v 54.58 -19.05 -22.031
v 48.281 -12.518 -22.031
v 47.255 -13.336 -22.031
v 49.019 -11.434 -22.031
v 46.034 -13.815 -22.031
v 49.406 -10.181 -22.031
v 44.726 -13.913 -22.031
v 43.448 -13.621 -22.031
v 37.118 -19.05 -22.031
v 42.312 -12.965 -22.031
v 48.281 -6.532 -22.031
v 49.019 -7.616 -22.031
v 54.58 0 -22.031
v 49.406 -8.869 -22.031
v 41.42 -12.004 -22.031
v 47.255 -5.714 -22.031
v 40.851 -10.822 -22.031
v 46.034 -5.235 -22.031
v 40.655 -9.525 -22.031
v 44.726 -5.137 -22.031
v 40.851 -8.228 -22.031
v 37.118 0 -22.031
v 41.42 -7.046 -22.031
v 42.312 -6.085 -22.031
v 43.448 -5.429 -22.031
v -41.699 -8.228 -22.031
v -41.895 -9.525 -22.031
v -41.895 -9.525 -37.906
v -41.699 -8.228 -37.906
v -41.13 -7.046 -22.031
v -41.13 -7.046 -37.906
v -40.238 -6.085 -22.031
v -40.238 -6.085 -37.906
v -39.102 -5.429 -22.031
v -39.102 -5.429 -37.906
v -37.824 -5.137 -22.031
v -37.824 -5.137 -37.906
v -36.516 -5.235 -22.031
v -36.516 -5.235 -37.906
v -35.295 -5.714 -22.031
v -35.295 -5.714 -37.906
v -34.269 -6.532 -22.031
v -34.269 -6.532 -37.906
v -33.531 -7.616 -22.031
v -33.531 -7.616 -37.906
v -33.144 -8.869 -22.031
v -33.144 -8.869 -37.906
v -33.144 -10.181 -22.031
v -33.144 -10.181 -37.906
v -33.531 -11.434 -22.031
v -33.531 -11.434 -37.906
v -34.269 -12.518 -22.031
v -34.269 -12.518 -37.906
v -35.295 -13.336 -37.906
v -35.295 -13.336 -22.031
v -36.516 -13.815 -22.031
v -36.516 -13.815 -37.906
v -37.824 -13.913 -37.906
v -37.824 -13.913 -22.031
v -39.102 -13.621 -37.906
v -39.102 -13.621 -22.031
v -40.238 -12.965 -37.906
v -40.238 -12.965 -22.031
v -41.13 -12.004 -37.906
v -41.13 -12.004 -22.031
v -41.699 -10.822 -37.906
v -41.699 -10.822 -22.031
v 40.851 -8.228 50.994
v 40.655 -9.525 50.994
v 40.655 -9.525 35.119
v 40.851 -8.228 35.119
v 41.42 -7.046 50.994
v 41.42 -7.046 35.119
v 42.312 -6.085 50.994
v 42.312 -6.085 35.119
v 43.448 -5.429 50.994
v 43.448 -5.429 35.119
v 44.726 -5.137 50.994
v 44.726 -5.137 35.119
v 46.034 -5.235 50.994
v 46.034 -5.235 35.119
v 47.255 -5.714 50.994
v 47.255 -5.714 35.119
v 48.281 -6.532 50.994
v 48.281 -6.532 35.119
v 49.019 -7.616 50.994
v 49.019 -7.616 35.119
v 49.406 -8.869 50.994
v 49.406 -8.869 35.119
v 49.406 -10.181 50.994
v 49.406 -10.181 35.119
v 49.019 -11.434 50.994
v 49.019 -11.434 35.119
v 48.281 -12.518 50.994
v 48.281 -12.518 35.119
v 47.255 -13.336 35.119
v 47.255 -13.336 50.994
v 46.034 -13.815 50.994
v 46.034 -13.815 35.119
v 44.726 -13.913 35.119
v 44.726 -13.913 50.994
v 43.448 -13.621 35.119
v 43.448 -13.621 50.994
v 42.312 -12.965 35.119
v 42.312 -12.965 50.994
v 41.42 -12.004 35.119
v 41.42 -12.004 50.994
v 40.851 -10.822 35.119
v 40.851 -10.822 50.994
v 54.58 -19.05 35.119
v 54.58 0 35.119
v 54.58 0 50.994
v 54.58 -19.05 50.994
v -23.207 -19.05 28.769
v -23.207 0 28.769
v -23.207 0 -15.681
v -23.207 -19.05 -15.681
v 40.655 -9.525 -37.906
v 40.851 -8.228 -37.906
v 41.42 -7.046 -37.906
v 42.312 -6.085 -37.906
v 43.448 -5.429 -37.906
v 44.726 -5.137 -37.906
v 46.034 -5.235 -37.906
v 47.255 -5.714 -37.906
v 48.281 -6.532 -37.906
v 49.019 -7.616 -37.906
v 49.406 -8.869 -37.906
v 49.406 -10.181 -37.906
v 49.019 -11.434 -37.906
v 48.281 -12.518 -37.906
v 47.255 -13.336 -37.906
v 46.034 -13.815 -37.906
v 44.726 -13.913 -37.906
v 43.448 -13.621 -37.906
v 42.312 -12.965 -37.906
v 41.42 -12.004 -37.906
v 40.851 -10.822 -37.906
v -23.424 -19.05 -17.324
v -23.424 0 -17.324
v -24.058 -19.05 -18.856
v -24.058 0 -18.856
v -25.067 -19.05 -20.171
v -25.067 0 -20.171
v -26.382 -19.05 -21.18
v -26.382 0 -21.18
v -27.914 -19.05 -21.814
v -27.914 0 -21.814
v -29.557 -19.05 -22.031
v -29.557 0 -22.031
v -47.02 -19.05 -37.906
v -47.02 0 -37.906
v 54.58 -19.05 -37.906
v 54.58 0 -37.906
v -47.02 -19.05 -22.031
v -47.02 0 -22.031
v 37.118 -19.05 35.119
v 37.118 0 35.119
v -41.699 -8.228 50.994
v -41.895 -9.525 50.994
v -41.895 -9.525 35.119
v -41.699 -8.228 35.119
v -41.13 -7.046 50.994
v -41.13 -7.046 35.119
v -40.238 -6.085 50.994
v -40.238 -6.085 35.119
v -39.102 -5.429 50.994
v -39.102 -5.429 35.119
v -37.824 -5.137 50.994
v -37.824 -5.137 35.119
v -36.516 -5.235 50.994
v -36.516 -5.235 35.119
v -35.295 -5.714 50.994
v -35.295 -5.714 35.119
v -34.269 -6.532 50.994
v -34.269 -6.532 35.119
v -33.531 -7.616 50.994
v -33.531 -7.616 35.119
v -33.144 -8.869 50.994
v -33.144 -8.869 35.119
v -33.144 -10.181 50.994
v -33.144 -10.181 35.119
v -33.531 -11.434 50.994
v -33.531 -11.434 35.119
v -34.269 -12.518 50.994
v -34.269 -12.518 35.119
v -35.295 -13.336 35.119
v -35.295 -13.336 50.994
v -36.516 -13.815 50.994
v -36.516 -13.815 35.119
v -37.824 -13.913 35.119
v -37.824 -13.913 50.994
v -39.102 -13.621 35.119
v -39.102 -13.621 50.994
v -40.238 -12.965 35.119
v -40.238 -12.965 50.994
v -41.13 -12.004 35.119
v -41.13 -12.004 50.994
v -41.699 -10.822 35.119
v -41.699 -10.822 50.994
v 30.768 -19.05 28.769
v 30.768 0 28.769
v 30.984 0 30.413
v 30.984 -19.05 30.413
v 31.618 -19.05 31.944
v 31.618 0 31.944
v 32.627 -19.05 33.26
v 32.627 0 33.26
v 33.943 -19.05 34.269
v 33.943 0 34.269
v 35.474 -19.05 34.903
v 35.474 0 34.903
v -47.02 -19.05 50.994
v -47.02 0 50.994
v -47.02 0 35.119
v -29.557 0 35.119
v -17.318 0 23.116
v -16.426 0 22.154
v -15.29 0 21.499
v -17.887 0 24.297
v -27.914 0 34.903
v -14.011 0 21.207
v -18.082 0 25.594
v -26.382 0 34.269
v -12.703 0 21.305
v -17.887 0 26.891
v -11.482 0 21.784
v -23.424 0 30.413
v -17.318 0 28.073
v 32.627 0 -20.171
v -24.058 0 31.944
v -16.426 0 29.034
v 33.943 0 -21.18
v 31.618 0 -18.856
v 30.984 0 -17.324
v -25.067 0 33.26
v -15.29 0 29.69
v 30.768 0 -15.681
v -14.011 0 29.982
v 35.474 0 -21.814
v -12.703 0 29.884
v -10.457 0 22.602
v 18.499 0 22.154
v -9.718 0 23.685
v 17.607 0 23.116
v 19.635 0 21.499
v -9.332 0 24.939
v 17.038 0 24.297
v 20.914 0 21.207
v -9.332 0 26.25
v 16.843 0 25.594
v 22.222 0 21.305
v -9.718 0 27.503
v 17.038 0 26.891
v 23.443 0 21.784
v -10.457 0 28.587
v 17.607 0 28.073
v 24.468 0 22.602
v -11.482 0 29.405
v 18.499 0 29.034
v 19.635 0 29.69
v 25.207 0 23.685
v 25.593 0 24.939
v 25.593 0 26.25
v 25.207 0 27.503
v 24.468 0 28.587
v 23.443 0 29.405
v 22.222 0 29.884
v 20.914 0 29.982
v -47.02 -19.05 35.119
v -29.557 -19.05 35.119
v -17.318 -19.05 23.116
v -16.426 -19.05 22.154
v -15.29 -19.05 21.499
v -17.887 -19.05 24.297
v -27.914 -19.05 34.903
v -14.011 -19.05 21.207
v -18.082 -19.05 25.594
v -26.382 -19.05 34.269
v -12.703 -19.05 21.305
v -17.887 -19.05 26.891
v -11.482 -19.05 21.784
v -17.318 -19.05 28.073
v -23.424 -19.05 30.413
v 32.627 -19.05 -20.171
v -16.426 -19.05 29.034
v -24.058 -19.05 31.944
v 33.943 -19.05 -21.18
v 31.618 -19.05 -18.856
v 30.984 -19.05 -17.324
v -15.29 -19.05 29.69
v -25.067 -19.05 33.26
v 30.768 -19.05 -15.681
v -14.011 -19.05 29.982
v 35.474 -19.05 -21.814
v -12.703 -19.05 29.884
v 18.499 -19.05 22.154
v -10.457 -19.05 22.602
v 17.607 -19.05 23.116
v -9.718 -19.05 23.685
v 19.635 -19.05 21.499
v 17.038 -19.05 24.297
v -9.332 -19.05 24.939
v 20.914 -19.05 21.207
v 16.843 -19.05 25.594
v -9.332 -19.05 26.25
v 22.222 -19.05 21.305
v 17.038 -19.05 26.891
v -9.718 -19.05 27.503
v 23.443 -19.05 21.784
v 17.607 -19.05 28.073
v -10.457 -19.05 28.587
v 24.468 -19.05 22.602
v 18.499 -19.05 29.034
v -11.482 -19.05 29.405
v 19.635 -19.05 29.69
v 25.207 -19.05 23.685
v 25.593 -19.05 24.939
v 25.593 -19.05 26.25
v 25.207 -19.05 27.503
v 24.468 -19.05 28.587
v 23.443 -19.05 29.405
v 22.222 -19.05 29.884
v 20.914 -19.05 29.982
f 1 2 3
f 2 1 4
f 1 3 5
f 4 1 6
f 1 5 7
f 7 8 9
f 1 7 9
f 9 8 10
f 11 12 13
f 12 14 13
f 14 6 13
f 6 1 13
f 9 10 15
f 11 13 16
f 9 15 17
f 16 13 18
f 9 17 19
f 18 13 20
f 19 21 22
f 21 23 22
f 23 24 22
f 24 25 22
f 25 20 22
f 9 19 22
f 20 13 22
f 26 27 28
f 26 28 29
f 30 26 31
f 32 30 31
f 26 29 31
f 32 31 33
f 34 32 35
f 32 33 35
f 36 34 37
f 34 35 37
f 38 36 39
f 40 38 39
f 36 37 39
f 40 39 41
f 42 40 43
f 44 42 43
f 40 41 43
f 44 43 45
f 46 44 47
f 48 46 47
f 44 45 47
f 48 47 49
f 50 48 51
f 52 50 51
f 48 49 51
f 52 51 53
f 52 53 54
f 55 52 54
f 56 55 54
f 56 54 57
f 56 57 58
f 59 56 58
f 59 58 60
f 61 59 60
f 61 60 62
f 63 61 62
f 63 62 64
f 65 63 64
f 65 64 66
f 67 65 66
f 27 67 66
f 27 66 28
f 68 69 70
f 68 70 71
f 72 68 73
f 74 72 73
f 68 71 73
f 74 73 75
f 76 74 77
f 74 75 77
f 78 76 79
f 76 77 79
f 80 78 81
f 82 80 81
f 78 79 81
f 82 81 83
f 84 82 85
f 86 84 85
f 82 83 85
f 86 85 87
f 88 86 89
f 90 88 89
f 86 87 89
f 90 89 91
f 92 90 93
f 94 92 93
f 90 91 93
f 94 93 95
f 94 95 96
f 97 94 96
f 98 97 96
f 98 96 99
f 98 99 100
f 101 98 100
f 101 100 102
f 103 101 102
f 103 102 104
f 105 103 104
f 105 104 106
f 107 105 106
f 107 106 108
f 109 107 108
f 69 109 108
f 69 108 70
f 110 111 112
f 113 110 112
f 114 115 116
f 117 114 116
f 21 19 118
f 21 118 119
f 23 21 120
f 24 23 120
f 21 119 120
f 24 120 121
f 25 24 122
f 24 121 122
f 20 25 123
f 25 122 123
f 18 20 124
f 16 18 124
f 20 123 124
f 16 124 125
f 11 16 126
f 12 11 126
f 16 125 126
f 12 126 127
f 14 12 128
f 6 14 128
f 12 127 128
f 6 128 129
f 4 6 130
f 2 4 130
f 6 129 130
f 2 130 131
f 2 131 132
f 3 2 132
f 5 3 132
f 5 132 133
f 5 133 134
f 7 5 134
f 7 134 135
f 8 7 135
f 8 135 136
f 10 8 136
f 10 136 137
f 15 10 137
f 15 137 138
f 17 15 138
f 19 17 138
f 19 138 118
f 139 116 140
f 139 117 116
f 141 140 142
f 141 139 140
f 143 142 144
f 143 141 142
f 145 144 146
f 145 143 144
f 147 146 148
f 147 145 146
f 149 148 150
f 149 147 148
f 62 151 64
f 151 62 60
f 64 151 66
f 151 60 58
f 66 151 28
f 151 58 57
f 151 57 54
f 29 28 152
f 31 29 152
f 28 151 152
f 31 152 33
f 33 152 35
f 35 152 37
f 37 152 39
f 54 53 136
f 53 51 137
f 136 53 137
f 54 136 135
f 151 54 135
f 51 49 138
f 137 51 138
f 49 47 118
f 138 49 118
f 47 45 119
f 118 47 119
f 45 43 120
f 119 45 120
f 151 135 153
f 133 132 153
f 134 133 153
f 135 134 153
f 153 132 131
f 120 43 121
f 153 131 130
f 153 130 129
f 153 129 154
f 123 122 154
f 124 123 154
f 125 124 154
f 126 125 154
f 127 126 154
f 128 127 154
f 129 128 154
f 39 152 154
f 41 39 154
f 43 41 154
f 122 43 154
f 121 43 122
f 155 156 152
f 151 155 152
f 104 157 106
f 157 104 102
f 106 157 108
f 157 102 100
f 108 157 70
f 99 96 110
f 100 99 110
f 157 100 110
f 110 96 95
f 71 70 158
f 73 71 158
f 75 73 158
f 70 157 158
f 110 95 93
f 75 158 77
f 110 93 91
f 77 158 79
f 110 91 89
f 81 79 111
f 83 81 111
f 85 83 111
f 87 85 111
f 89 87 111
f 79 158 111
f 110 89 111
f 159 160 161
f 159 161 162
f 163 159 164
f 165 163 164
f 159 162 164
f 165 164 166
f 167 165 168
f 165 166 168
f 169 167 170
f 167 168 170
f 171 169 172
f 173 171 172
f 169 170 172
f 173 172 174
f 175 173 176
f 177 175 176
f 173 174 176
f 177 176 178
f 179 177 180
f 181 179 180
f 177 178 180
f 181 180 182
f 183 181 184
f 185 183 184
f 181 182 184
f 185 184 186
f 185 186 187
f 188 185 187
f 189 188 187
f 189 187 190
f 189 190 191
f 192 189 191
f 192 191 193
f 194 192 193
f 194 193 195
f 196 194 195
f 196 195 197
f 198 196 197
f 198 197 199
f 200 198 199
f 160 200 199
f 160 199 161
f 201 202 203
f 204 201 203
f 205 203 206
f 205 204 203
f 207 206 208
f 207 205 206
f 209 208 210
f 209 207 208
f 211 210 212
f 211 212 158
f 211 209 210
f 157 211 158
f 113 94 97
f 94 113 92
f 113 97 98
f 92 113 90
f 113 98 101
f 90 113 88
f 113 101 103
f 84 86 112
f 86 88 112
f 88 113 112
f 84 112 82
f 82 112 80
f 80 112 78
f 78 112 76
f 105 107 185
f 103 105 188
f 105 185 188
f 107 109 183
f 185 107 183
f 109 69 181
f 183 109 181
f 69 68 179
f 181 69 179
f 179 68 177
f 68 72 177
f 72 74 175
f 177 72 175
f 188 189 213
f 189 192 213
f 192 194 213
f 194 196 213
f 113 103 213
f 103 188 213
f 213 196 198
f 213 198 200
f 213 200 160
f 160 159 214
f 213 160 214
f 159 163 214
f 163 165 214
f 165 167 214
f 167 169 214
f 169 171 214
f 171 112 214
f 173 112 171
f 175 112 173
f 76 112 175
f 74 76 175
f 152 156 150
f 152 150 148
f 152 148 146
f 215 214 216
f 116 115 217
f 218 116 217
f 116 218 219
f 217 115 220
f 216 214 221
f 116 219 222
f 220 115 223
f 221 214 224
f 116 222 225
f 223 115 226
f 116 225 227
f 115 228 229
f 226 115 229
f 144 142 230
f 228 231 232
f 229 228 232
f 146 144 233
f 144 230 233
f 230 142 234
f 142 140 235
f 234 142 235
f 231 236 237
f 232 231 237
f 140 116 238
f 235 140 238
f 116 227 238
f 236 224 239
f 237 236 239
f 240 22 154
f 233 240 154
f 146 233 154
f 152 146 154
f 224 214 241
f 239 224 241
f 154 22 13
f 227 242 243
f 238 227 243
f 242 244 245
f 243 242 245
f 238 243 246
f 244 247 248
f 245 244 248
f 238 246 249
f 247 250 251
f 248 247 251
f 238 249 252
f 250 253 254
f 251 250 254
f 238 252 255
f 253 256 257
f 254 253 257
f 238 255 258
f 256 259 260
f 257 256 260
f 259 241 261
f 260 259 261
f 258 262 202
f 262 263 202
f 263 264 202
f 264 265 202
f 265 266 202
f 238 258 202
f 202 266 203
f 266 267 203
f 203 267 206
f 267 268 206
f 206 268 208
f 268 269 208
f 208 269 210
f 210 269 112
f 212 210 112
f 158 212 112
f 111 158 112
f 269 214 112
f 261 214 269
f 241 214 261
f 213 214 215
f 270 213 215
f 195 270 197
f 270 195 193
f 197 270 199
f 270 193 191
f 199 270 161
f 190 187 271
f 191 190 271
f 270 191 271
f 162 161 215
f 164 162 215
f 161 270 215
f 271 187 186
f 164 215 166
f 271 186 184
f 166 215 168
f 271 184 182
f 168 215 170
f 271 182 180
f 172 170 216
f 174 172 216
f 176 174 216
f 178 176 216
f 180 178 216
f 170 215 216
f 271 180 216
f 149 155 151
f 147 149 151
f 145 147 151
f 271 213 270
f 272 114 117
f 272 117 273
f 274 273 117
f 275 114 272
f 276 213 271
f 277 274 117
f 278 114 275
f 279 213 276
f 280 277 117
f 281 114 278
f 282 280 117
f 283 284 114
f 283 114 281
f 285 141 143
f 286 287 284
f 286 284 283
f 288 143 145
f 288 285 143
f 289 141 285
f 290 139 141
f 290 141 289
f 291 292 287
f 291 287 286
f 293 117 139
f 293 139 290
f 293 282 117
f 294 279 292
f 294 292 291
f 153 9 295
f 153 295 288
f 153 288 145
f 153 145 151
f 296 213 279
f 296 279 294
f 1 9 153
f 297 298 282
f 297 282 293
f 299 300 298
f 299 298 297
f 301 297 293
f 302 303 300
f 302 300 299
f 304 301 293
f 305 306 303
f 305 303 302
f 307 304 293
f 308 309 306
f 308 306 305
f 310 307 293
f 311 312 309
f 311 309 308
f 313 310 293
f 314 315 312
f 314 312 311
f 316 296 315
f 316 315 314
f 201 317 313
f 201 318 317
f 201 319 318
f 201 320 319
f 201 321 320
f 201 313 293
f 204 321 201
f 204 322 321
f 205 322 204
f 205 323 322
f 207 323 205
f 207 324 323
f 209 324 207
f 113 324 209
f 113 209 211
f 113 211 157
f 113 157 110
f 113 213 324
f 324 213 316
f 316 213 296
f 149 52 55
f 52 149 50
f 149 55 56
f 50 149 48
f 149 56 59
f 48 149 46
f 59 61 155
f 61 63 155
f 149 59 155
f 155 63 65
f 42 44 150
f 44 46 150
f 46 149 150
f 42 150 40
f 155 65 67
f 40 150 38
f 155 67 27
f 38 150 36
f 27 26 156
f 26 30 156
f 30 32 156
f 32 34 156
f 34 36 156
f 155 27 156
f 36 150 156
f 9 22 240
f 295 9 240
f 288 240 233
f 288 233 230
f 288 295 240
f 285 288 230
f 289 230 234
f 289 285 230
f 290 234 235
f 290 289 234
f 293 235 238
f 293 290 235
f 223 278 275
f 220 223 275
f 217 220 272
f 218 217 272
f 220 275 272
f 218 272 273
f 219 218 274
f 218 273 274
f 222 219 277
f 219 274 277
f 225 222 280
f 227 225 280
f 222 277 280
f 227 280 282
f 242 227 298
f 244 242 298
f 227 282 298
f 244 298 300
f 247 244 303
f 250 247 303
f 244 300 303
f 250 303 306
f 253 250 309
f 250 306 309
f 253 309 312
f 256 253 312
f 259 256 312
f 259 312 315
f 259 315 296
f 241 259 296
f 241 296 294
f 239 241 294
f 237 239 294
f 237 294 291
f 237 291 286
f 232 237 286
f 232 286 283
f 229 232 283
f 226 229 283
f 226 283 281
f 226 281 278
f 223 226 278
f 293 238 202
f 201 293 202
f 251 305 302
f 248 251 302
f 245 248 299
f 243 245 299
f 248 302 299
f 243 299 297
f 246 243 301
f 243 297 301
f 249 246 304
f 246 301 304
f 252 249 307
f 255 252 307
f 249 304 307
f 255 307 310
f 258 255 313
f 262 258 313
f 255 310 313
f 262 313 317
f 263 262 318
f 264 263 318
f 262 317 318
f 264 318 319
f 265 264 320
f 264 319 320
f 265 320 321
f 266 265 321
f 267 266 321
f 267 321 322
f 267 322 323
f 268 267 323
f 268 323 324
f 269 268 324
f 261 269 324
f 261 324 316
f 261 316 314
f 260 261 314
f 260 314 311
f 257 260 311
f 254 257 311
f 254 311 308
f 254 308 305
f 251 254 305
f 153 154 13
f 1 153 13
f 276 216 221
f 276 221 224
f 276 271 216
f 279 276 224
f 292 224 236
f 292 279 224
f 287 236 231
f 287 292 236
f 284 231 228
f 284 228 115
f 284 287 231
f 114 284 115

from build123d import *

# Parameters (mm, degrees)
F1_DEPTH = 19.05
F2_R     = 6.35
F4_D     = 8.8
F5_D     = 8.8


with BuildPart() as f1:
    # F0 (on Front) → F1 (new body)
    with BuildSketch(Plane.XZ):
        Polygon((3.7801079915, 50.9944110171), (-47.0198920085, 50.9944110171), (-47.0198920085, 35.1194110171), (-23.2073920085, 35.1194110171), (-23.2073920085, 6.5444110171), (-23.2073920085, -22.0305889829), (-47.0198920085, -22.0305889829), (-47.0198920085, -37.9055889829), (54.5801079915, -37.9055889829), (54.5801079915, -22.0305889829), (30.7676079915, -22.0305889829), (30.7676079915, 6.5444110171), (30.7676079915, 35.1194110171), (54.5801079915, 35.1194110171), (54.5801079915, 50.9944110171), align=None)
    extrude(amount=F1_DEPTH)

    # F2
    f2_edges = [f1.edges().sort_by_distance(p)[0] for p in [
        (30.767608, -9.525, -22.030589),
        (30.767608, -9.525, 35.119411),
        (-23.207392, -9.525, -22.030589),
        (-23.207392, -9.525, 35.119411),
    ]]
    fillet(f2_edges, radius=F2_R)

    # F4 (through all)
    with Locations(Plane.XY.offset(50.9944110171)):
        with Locations((-37.4948920085, -9.525), (45.0551079915, -9.525)):
            Hole(F4_D / 2)

    # F5 (through all)
    with Locations(Plane(origin=(0, 0, 0), x_dir=(1, 0, 0), z_dir=(0, 1, 0))):
        with Locations((-13.6823920085, -25.5944110171), (21.2426079915, -25.5944110171)):
            Hole(F5_D / 2)


solid = f1.part
